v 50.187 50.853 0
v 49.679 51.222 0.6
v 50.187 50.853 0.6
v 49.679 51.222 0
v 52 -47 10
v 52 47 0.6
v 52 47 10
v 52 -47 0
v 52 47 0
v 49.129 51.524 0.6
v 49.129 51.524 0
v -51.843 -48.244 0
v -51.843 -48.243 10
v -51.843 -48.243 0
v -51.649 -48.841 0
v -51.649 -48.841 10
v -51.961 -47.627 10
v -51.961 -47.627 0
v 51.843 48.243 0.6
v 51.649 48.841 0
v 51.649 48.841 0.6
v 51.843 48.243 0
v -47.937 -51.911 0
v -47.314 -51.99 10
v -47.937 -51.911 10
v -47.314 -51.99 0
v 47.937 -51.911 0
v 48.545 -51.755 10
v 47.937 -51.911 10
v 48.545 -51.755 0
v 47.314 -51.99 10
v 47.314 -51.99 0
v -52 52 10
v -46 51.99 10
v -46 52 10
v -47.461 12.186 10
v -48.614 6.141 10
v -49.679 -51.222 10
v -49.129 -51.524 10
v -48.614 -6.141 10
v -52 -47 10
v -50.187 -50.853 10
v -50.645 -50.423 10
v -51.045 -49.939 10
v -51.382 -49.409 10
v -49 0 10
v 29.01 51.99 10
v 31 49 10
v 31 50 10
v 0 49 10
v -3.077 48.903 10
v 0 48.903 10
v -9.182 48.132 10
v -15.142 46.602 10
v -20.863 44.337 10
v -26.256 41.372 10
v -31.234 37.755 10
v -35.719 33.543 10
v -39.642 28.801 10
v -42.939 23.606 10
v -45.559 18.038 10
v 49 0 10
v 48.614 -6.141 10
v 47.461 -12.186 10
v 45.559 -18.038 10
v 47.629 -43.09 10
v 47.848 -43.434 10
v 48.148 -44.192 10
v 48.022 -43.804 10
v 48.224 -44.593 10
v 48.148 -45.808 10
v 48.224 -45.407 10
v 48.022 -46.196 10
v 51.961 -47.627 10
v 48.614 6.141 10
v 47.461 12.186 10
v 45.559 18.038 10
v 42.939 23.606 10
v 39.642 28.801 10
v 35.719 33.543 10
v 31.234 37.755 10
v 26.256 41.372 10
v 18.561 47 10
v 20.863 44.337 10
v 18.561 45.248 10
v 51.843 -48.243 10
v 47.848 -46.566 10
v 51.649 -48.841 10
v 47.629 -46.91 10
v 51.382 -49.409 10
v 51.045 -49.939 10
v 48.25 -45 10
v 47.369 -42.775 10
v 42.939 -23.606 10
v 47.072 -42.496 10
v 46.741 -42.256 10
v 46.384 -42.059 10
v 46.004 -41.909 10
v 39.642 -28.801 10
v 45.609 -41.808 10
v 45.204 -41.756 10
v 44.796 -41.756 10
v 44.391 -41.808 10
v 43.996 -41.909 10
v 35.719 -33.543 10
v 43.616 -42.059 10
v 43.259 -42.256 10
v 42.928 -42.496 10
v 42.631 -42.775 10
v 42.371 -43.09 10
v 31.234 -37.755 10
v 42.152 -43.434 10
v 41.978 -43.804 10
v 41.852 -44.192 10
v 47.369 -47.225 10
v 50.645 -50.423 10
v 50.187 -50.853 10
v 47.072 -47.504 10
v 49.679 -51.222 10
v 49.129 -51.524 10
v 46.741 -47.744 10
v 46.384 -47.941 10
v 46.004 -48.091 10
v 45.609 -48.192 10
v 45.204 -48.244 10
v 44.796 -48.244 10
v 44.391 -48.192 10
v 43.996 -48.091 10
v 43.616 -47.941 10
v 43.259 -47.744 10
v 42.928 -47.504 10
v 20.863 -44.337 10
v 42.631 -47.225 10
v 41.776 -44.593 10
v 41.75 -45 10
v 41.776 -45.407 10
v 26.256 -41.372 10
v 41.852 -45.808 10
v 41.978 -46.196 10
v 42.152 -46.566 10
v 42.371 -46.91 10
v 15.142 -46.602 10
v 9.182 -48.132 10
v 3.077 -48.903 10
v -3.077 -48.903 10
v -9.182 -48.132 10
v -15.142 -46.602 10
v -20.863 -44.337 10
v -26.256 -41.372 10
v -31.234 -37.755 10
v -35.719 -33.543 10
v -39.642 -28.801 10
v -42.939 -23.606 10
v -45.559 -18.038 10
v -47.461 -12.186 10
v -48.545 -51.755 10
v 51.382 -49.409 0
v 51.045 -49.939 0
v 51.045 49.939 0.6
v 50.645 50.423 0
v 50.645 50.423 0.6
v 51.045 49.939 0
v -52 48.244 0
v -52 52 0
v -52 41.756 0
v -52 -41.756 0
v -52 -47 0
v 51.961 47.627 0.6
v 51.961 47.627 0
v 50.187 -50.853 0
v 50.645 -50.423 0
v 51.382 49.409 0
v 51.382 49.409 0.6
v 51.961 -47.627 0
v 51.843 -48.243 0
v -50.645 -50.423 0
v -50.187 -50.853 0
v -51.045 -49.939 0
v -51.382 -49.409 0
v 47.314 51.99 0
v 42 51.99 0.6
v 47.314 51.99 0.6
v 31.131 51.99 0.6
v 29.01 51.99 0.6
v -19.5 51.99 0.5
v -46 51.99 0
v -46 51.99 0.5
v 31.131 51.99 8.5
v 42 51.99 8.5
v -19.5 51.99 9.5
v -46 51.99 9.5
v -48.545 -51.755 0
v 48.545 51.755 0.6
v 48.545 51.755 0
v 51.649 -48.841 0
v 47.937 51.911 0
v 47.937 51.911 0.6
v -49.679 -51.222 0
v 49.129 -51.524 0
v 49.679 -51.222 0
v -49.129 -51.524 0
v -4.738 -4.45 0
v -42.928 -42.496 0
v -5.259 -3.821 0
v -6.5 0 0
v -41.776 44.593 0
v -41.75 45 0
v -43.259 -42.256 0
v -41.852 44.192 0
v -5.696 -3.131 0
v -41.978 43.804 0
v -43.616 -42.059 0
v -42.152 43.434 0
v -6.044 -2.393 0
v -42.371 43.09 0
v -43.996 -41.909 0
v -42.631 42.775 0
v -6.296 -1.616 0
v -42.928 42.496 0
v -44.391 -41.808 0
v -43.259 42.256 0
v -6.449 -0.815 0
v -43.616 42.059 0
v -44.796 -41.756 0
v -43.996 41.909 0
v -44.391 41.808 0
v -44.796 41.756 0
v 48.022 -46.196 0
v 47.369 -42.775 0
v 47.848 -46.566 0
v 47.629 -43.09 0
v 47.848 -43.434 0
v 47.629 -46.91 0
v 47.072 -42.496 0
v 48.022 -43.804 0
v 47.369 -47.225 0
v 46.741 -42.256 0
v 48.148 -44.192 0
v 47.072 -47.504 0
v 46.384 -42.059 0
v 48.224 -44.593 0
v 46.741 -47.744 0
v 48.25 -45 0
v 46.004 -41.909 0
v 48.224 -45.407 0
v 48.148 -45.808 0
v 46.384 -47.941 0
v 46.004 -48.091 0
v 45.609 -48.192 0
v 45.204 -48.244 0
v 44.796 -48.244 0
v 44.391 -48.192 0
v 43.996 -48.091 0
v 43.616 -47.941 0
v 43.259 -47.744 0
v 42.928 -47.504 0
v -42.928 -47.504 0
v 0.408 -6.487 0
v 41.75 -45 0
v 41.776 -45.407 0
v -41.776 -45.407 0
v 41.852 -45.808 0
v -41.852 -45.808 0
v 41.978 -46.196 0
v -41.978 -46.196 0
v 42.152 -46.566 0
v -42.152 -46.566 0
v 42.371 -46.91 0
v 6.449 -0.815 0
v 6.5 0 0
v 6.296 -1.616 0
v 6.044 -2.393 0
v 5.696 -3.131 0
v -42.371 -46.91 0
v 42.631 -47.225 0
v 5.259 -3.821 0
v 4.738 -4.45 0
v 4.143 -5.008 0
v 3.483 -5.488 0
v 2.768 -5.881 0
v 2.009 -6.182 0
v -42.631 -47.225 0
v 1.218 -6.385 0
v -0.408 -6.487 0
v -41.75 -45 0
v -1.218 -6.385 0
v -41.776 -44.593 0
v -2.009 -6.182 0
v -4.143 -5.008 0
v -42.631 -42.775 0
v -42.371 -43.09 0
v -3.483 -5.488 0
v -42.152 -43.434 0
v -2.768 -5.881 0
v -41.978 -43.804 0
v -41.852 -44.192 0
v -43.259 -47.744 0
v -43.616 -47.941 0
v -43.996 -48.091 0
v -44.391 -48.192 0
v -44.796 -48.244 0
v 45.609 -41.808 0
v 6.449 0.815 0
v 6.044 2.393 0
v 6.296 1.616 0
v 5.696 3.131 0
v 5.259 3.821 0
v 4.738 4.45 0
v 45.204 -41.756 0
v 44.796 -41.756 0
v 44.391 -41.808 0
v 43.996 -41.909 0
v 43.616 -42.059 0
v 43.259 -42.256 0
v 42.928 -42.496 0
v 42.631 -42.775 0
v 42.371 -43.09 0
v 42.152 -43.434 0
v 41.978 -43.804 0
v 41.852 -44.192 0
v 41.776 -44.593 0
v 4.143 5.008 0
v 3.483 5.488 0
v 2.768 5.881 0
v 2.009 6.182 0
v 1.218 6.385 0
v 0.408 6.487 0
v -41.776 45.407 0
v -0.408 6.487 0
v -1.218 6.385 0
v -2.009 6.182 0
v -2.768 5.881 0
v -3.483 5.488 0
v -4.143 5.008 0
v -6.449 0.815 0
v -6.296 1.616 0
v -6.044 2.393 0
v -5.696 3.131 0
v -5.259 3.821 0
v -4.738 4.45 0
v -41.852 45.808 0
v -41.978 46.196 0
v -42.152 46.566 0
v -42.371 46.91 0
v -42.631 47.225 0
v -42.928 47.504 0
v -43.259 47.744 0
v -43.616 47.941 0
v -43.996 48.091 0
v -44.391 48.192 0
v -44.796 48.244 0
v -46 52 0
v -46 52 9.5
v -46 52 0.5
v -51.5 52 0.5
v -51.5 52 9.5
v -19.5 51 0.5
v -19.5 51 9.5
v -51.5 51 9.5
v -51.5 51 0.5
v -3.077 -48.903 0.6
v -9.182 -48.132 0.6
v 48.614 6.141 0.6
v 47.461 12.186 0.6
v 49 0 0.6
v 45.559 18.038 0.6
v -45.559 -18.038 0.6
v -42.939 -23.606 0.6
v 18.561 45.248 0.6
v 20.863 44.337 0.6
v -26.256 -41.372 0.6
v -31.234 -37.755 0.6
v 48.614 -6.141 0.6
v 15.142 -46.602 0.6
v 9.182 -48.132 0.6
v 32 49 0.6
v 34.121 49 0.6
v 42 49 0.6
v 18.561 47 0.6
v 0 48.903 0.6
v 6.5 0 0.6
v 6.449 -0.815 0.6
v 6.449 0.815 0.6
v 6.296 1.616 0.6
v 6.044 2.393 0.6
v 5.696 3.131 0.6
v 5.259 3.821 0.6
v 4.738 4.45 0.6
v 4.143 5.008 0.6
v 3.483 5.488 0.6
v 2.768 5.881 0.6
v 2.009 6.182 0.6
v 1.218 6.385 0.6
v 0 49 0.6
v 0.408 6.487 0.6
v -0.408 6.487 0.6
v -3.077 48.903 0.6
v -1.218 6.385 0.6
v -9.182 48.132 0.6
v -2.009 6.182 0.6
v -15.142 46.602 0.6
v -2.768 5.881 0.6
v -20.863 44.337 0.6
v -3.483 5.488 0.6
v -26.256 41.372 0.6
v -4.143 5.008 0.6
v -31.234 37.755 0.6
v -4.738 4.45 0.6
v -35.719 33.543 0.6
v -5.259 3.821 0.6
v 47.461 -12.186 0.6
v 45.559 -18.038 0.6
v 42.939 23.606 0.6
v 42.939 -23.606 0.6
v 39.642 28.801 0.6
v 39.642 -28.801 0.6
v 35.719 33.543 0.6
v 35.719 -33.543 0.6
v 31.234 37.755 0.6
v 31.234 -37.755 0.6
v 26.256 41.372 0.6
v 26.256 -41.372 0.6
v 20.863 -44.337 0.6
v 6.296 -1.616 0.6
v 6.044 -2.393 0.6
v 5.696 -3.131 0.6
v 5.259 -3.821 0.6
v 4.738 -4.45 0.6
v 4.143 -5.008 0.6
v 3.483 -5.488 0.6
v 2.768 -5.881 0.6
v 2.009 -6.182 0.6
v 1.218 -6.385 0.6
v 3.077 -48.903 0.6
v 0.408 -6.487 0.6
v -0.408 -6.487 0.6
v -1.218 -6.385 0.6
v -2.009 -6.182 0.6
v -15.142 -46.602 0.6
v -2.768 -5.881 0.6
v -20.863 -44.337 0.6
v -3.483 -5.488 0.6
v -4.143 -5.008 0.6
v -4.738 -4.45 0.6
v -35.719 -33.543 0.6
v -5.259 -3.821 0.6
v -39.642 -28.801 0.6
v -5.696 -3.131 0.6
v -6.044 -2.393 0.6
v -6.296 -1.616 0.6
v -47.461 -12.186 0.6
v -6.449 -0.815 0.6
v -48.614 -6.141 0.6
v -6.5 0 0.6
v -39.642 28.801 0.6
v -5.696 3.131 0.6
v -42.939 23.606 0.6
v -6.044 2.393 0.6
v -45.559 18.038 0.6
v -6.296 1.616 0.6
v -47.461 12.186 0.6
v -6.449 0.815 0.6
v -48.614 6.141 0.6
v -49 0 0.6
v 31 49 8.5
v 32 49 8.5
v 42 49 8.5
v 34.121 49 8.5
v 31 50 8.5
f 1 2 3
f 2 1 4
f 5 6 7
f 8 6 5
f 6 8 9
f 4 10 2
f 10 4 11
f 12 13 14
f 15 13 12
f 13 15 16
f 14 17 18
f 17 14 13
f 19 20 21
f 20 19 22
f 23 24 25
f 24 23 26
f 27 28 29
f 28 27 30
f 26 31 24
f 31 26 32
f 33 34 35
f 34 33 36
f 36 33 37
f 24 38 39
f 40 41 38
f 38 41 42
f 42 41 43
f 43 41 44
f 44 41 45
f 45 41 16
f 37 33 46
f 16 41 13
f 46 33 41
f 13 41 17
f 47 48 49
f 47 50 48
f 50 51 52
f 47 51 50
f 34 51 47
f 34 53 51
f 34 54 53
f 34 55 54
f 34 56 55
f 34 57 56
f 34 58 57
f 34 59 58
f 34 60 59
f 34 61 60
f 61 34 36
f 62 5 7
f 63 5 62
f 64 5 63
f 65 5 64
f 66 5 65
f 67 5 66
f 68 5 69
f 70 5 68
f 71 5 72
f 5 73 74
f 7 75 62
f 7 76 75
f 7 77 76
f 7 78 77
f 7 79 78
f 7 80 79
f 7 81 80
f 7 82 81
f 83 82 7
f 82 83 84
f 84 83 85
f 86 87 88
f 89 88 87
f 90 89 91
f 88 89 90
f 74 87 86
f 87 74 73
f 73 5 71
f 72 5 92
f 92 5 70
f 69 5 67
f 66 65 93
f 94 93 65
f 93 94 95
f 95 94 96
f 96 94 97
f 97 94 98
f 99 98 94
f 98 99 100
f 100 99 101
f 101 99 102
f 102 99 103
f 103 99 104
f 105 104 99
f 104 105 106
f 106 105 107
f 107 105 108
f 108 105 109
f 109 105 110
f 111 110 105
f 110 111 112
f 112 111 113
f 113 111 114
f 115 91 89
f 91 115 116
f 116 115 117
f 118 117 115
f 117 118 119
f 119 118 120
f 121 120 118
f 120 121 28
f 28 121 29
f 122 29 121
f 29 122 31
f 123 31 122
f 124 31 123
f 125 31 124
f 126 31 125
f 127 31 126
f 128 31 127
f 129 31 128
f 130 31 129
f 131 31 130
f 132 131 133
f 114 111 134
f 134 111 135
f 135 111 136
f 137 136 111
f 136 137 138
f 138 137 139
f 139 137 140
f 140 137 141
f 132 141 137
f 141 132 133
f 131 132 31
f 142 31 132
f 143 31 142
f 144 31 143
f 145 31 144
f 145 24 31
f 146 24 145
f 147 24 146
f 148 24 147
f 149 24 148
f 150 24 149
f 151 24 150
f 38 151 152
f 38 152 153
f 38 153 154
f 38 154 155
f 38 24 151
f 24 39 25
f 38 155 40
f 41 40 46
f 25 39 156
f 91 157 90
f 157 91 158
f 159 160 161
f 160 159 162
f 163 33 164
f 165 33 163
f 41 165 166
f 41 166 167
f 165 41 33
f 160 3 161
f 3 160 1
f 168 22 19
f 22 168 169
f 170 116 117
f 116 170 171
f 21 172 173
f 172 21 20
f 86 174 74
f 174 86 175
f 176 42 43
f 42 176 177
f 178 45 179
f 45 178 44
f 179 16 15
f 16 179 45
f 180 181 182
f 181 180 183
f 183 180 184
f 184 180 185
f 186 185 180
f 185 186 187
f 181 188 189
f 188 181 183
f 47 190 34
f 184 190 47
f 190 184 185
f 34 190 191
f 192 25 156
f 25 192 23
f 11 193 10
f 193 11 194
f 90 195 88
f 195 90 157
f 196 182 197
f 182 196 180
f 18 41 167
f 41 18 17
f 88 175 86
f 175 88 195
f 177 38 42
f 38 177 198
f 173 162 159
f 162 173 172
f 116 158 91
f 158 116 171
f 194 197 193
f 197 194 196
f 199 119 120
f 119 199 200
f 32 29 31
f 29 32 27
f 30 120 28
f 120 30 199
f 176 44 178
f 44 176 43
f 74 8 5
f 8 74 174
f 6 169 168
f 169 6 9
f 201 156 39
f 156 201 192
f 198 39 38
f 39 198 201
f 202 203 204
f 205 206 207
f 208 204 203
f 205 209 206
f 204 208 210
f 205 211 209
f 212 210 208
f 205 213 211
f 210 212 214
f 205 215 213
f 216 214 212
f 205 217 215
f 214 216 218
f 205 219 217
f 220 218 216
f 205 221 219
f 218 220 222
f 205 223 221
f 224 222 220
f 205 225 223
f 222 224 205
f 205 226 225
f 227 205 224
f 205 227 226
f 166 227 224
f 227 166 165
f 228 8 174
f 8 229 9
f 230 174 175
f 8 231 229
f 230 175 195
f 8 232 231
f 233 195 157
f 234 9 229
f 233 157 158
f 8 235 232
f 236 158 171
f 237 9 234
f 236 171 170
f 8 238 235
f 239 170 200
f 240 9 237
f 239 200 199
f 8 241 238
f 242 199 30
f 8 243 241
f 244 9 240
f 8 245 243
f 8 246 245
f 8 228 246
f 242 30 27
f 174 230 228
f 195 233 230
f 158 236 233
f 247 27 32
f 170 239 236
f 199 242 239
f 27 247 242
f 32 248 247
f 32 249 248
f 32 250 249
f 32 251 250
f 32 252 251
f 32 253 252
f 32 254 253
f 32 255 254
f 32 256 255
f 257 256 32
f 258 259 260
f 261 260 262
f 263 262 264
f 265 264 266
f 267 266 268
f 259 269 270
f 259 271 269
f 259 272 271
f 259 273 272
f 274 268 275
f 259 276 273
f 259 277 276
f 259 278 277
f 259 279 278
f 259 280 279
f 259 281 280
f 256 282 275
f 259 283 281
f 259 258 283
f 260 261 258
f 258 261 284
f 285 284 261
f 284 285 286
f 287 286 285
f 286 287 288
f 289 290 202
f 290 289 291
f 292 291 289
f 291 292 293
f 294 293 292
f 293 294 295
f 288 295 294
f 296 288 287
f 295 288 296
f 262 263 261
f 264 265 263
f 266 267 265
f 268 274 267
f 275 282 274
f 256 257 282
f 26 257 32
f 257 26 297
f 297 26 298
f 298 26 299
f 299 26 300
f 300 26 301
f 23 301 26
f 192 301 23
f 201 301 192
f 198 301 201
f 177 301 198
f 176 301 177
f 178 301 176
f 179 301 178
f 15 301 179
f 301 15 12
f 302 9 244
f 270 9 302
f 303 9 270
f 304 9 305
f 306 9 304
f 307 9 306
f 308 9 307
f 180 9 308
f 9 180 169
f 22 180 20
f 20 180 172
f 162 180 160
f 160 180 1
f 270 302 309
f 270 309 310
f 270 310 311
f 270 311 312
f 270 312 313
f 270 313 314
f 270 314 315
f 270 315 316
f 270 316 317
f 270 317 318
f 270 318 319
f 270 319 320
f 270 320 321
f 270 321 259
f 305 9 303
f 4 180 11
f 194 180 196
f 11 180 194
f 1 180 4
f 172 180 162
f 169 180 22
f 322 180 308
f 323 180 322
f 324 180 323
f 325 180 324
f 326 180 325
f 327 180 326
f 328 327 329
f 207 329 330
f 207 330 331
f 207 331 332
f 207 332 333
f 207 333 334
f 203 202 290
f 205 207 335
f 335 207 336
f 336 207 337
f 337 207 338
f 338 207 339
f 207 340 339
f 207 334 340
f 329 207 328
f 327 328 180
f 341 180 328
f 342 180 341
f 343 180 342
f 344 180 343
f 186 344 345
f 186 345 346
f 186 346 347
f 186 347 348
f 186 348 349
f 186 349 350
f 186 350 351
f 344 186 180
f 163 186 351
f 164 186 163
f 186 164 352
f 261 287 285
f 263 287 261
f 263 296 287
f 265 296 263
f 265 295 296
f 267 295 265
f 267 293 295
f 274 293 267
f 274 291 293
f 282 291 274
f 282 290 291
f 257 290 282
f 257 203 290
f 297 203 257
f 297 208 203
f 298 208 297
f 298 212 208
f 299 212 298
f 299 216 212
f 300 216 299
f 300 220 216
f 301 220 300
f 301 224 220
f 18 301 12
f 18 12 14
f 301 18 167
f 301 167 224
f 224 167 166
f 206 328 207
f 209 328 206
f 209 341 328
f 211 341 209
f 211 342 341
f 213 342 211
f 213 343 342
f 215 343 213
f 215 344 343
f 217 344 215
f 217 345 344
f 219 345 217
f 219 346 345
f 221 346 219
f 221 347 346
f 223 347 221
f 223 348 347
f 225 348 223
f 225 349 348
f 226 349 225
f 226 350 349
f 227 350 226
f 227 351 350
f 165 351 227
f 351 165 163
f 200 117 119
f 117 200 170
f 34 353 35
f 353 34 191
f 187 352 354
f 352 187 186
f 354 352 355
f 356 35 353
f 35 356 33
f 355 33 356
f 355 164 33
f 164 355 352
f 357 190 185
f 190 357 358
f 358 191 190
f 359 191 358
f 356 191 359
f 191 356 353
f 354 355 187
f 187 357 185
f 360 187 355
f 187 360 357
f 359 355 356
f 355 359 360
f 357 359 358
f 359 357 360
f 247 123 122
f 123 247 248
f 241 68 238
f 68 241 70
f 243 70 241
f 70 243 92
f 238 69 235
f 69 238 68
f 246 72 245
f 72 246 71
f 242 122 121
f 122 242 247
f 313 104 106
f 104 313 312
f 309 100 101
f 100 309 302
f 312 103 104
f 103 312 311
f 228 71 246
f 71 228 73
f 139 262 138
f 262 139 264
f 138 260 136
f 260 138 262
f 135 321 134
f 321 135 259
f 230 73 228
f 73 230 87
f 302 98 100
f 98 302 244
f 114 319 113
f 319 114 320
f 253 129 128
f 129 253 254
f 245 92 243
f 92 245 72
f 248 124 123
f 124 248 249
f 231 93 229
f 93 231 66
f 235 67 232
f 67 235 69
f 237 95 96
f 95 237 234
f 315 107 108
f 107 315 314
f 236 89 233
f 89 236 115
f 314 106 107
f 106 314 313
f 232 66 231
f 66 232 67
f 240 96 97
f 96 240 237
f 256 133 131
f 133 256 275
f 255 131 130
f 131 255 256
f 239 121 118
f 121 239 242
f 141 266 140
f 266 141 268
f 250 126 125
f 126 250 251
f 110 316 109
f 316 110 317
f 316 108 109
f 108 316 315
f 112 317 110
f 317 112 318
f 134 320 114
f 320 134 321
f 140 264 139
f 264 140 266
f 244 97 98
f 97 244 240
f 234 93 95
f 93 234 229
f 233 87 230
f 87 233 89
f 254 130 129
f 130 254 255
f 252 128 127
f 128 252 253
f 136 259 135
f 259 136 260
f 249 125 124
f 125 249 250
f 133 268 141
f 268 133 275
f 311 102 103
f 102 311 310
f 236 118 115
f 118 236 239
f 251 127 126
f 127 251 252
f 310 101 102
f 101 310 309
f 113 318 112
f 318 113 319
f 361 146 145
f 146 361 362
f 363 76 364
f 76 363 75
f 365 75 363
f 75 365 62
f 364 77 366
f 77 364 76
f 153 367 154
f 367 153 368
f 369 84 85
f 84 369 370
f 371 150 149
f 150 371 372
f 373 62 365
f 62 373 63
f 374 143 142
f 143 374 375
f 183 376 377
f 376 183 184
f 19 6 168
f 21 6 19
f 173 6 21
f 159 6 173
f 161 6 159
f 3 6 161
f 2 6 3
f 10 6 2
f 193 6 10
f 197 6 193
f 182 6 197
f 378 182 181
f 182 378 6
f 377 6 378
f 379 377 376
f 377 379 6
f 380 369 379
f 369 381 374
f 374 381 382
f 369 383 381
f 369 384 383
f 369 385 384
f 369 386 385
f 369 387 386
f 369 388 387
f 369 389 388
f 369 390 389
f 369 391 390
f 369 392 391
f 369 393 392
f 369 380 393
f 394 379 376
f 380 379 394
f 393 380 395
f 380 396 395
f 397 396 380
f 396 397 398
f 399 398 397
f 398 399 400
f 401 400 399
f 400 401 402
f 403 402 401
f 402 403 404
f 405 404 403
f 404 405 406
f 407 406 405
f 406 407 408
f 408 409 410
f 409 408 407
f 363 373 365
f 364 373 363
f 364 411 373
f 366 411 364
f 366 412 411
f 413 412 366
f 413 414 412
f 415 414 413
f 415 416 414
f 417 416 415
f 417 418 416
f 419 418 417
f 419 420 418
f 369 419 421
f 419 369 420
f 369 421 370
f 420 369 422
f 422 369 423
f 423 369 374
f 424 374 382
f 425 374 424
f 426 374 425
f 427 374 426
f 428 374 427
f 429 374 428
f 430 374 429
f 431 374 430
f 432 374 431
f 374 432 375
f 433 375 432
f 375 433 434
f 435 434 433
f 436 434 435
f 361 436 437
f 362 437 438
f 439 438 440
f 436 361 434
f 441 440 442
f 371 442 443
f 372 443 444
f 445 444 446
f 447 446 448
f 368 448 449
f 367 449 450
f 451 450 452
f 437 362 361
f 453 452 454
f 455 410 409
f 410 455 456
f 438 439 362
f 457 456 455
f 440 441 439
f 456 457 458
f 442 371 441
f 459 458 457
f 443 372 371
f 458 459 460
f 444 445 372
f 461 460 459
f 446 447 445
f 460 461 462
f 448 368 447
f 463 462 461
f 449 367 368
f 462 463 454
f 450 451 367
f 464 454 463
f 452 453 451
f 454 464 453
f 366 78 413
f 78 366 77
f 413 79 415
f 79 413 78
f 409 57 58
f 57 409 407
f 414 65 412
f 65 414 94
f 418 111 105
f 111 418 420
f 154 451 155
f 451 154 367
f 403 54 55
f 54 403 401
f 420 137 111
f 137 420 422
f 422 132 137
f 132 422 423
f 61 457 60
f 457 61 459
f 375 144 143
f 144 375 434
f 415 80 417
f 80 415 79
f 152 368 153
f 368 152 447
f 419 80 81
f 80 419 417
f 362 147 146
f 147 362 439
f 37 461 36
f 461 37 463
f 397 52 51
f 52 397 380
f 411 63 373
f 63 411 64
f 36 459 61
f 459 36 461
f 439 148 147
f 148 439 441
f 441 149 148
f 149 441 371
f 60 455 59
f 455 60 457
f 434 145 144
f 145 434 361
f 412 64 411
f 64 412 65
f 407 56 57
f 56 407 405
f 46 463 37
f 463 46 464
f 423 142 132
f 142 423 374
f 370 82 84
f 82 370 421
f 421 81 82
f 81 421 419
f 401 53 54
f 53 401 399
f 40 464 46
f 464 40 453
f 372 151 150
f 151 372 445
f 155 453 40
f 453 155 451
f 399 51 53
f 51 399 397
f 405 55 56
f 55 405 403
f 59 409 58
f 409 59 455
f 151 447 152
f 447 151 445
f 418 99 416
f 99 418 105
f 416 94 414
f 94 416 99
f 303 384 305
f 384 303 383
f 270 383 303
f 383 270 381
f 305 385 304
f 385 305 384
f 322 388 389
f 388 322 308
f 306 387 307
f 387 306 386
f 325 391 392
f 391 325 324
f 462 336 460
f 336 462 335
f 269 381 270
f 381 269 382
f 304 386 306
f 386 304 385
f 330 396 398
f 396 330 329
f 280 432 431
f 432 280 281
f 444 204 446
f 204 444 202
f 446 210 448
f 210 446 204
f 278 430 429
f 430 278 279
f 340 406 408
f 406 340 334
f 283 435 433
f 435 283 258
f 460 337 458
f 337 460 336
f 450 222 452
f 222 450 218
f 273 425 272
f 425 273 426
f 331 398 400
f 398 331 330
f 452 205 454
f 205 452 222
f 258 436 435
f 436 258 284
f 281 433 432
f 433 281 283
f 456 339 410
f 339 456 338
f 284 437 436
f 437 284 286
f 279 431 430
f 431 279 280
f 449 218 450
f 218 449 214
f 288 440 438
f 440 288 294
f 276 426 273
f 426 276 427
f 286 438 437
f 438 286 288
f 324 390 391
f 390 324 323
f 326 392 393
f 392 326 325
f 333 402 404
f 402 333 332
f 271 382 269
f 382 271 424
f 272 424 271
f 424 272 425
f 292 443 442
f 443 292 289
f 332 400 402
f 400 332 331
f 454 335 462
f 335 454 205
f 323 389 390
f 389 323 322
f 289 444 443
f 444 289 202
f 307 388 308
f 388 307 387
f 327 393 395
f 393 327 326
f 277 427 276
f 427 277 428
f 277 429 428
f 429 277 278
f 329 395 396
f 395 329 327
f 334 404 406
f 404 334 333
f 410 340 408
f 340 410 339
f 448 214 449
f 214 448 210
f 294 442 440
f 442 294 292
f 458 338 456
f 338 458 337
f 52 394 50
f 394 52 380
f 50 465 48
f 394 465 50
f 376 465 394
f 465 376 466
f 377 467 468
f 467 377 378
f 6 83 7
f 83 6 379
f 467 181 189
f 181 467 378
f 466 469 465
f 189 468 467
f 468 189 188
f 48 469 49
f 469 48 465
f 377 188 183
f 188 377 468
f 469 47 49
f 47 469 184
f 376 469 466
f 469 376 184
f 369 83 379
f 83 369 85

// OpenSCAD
$fn = 50;


difference() {
	union() {
		hull() {
			translate(v = [-47.0000000000, 47.0000000000, 0]) {
				cylinder(h = 10, r = 5);
			}
			translate(v = [47.0000000000, 47.0000000000, 0]) {
				cylinder(h = 10, r = 5);
			}
			translate(v = [-47.0000000000, -47.0000000000, 0]) {
				cylinder(h = 10, r = 5);
			}
			translate(v = [47.0000000000, -47.0000000000, 0]) {
				cylinder(h = 10, r = 5);
			}
		}
		translate(v = [-52.0000000000, 46.0000000000, 0]) {
			cube(size = [6, 6, 10]);
		}
	}
	union() {
		translate(v = [-52.5000000000, -45.0000000000, -250.0000000000]) {
			rotate(a = [0, 0, 0]) {
				difference() {
					union() {
						hull() {
							translate(v = [7.5000000000, 0, 0]) {
								cylinder(h = 250, r = 3.2500000000, r1 = 3.2500000000, r2 = 3.2500000000);
							}
							translate(v = [-7.5000000000, 0, 0]) {
								cylinder(h = 250, r = 3.2500000000, r1 = 3.2500000000, r2 = 3.2500000000);
							}
						}
					}
					union();
				}
			}
		}
		translate(v = [-52.5000000000, 45.0000000000, -250.0000000000]) {
			rotate(a = [0, 0, 0]) {
				difference() {
					union() {
						hull() {
							translate(v = [7.5000000000, 0, 0]) {
								cylinder(h = 250, r = 3.2500000000, r1 = 3.2500000000, r2 = 3.2500000000);
							}
							translate(v = [-7.5000000000, 0, 0]) {
								cylinder(h = 250, r = 3.2500000000, r1 = 3.2500000000, r2 = 3.2500000000);
							}
						}
					}
					union();
				}
			}
		}
		translate(v = [-51.5000000000, 51.0000000000, 0.5000000000]) {
			cube(size = [32, 1, 9.0000000000]);
		}
		translate(v = [45.0000000000, -45.0000000000, -50.0000000000]) {
			cylinder(h = 100, r = 3.2500000000);
		}
		translate(v = [0, 0, 0.6000000000]) {
			cylinder(h = 12.4000000000, r = 49.0000000000);
		}
		translate(v = [0, 0, -5.0000000000]) {
			cylinder(h = 10, r = 6.5000000000);
		}
		translate(v = [0.0000000000, 47.0000000000, 0.6000000000]) {
			cube(size = [52.0000000000, 2, 12.4000000000]);
		}
		translate(v = [42.0000000000, 47.0000000000, 0.6000000000]) {
			cube(size = [10, 5, 12.4000000000]);
		}
		translate(v = [31.0000000000, 47.0000000000, 8.5000000000]) {
			cube(size = [21, 5, 1.5000000000]);
		}
		translate(v = [28.2500000000, 52.7500000000, 0.6000000000]) {
			rotate(a = [0, 0, -45]) {
				cube(size = [7.5000000000, 1.5000000000, 12.4000000000]);
			}
		}
		translate(v = [11.0610000000, 45.0000000000, 0.6000000000]) {
			cube(size = [7.5000000000, 2, 9.4000000000]);
		}
	}
}
